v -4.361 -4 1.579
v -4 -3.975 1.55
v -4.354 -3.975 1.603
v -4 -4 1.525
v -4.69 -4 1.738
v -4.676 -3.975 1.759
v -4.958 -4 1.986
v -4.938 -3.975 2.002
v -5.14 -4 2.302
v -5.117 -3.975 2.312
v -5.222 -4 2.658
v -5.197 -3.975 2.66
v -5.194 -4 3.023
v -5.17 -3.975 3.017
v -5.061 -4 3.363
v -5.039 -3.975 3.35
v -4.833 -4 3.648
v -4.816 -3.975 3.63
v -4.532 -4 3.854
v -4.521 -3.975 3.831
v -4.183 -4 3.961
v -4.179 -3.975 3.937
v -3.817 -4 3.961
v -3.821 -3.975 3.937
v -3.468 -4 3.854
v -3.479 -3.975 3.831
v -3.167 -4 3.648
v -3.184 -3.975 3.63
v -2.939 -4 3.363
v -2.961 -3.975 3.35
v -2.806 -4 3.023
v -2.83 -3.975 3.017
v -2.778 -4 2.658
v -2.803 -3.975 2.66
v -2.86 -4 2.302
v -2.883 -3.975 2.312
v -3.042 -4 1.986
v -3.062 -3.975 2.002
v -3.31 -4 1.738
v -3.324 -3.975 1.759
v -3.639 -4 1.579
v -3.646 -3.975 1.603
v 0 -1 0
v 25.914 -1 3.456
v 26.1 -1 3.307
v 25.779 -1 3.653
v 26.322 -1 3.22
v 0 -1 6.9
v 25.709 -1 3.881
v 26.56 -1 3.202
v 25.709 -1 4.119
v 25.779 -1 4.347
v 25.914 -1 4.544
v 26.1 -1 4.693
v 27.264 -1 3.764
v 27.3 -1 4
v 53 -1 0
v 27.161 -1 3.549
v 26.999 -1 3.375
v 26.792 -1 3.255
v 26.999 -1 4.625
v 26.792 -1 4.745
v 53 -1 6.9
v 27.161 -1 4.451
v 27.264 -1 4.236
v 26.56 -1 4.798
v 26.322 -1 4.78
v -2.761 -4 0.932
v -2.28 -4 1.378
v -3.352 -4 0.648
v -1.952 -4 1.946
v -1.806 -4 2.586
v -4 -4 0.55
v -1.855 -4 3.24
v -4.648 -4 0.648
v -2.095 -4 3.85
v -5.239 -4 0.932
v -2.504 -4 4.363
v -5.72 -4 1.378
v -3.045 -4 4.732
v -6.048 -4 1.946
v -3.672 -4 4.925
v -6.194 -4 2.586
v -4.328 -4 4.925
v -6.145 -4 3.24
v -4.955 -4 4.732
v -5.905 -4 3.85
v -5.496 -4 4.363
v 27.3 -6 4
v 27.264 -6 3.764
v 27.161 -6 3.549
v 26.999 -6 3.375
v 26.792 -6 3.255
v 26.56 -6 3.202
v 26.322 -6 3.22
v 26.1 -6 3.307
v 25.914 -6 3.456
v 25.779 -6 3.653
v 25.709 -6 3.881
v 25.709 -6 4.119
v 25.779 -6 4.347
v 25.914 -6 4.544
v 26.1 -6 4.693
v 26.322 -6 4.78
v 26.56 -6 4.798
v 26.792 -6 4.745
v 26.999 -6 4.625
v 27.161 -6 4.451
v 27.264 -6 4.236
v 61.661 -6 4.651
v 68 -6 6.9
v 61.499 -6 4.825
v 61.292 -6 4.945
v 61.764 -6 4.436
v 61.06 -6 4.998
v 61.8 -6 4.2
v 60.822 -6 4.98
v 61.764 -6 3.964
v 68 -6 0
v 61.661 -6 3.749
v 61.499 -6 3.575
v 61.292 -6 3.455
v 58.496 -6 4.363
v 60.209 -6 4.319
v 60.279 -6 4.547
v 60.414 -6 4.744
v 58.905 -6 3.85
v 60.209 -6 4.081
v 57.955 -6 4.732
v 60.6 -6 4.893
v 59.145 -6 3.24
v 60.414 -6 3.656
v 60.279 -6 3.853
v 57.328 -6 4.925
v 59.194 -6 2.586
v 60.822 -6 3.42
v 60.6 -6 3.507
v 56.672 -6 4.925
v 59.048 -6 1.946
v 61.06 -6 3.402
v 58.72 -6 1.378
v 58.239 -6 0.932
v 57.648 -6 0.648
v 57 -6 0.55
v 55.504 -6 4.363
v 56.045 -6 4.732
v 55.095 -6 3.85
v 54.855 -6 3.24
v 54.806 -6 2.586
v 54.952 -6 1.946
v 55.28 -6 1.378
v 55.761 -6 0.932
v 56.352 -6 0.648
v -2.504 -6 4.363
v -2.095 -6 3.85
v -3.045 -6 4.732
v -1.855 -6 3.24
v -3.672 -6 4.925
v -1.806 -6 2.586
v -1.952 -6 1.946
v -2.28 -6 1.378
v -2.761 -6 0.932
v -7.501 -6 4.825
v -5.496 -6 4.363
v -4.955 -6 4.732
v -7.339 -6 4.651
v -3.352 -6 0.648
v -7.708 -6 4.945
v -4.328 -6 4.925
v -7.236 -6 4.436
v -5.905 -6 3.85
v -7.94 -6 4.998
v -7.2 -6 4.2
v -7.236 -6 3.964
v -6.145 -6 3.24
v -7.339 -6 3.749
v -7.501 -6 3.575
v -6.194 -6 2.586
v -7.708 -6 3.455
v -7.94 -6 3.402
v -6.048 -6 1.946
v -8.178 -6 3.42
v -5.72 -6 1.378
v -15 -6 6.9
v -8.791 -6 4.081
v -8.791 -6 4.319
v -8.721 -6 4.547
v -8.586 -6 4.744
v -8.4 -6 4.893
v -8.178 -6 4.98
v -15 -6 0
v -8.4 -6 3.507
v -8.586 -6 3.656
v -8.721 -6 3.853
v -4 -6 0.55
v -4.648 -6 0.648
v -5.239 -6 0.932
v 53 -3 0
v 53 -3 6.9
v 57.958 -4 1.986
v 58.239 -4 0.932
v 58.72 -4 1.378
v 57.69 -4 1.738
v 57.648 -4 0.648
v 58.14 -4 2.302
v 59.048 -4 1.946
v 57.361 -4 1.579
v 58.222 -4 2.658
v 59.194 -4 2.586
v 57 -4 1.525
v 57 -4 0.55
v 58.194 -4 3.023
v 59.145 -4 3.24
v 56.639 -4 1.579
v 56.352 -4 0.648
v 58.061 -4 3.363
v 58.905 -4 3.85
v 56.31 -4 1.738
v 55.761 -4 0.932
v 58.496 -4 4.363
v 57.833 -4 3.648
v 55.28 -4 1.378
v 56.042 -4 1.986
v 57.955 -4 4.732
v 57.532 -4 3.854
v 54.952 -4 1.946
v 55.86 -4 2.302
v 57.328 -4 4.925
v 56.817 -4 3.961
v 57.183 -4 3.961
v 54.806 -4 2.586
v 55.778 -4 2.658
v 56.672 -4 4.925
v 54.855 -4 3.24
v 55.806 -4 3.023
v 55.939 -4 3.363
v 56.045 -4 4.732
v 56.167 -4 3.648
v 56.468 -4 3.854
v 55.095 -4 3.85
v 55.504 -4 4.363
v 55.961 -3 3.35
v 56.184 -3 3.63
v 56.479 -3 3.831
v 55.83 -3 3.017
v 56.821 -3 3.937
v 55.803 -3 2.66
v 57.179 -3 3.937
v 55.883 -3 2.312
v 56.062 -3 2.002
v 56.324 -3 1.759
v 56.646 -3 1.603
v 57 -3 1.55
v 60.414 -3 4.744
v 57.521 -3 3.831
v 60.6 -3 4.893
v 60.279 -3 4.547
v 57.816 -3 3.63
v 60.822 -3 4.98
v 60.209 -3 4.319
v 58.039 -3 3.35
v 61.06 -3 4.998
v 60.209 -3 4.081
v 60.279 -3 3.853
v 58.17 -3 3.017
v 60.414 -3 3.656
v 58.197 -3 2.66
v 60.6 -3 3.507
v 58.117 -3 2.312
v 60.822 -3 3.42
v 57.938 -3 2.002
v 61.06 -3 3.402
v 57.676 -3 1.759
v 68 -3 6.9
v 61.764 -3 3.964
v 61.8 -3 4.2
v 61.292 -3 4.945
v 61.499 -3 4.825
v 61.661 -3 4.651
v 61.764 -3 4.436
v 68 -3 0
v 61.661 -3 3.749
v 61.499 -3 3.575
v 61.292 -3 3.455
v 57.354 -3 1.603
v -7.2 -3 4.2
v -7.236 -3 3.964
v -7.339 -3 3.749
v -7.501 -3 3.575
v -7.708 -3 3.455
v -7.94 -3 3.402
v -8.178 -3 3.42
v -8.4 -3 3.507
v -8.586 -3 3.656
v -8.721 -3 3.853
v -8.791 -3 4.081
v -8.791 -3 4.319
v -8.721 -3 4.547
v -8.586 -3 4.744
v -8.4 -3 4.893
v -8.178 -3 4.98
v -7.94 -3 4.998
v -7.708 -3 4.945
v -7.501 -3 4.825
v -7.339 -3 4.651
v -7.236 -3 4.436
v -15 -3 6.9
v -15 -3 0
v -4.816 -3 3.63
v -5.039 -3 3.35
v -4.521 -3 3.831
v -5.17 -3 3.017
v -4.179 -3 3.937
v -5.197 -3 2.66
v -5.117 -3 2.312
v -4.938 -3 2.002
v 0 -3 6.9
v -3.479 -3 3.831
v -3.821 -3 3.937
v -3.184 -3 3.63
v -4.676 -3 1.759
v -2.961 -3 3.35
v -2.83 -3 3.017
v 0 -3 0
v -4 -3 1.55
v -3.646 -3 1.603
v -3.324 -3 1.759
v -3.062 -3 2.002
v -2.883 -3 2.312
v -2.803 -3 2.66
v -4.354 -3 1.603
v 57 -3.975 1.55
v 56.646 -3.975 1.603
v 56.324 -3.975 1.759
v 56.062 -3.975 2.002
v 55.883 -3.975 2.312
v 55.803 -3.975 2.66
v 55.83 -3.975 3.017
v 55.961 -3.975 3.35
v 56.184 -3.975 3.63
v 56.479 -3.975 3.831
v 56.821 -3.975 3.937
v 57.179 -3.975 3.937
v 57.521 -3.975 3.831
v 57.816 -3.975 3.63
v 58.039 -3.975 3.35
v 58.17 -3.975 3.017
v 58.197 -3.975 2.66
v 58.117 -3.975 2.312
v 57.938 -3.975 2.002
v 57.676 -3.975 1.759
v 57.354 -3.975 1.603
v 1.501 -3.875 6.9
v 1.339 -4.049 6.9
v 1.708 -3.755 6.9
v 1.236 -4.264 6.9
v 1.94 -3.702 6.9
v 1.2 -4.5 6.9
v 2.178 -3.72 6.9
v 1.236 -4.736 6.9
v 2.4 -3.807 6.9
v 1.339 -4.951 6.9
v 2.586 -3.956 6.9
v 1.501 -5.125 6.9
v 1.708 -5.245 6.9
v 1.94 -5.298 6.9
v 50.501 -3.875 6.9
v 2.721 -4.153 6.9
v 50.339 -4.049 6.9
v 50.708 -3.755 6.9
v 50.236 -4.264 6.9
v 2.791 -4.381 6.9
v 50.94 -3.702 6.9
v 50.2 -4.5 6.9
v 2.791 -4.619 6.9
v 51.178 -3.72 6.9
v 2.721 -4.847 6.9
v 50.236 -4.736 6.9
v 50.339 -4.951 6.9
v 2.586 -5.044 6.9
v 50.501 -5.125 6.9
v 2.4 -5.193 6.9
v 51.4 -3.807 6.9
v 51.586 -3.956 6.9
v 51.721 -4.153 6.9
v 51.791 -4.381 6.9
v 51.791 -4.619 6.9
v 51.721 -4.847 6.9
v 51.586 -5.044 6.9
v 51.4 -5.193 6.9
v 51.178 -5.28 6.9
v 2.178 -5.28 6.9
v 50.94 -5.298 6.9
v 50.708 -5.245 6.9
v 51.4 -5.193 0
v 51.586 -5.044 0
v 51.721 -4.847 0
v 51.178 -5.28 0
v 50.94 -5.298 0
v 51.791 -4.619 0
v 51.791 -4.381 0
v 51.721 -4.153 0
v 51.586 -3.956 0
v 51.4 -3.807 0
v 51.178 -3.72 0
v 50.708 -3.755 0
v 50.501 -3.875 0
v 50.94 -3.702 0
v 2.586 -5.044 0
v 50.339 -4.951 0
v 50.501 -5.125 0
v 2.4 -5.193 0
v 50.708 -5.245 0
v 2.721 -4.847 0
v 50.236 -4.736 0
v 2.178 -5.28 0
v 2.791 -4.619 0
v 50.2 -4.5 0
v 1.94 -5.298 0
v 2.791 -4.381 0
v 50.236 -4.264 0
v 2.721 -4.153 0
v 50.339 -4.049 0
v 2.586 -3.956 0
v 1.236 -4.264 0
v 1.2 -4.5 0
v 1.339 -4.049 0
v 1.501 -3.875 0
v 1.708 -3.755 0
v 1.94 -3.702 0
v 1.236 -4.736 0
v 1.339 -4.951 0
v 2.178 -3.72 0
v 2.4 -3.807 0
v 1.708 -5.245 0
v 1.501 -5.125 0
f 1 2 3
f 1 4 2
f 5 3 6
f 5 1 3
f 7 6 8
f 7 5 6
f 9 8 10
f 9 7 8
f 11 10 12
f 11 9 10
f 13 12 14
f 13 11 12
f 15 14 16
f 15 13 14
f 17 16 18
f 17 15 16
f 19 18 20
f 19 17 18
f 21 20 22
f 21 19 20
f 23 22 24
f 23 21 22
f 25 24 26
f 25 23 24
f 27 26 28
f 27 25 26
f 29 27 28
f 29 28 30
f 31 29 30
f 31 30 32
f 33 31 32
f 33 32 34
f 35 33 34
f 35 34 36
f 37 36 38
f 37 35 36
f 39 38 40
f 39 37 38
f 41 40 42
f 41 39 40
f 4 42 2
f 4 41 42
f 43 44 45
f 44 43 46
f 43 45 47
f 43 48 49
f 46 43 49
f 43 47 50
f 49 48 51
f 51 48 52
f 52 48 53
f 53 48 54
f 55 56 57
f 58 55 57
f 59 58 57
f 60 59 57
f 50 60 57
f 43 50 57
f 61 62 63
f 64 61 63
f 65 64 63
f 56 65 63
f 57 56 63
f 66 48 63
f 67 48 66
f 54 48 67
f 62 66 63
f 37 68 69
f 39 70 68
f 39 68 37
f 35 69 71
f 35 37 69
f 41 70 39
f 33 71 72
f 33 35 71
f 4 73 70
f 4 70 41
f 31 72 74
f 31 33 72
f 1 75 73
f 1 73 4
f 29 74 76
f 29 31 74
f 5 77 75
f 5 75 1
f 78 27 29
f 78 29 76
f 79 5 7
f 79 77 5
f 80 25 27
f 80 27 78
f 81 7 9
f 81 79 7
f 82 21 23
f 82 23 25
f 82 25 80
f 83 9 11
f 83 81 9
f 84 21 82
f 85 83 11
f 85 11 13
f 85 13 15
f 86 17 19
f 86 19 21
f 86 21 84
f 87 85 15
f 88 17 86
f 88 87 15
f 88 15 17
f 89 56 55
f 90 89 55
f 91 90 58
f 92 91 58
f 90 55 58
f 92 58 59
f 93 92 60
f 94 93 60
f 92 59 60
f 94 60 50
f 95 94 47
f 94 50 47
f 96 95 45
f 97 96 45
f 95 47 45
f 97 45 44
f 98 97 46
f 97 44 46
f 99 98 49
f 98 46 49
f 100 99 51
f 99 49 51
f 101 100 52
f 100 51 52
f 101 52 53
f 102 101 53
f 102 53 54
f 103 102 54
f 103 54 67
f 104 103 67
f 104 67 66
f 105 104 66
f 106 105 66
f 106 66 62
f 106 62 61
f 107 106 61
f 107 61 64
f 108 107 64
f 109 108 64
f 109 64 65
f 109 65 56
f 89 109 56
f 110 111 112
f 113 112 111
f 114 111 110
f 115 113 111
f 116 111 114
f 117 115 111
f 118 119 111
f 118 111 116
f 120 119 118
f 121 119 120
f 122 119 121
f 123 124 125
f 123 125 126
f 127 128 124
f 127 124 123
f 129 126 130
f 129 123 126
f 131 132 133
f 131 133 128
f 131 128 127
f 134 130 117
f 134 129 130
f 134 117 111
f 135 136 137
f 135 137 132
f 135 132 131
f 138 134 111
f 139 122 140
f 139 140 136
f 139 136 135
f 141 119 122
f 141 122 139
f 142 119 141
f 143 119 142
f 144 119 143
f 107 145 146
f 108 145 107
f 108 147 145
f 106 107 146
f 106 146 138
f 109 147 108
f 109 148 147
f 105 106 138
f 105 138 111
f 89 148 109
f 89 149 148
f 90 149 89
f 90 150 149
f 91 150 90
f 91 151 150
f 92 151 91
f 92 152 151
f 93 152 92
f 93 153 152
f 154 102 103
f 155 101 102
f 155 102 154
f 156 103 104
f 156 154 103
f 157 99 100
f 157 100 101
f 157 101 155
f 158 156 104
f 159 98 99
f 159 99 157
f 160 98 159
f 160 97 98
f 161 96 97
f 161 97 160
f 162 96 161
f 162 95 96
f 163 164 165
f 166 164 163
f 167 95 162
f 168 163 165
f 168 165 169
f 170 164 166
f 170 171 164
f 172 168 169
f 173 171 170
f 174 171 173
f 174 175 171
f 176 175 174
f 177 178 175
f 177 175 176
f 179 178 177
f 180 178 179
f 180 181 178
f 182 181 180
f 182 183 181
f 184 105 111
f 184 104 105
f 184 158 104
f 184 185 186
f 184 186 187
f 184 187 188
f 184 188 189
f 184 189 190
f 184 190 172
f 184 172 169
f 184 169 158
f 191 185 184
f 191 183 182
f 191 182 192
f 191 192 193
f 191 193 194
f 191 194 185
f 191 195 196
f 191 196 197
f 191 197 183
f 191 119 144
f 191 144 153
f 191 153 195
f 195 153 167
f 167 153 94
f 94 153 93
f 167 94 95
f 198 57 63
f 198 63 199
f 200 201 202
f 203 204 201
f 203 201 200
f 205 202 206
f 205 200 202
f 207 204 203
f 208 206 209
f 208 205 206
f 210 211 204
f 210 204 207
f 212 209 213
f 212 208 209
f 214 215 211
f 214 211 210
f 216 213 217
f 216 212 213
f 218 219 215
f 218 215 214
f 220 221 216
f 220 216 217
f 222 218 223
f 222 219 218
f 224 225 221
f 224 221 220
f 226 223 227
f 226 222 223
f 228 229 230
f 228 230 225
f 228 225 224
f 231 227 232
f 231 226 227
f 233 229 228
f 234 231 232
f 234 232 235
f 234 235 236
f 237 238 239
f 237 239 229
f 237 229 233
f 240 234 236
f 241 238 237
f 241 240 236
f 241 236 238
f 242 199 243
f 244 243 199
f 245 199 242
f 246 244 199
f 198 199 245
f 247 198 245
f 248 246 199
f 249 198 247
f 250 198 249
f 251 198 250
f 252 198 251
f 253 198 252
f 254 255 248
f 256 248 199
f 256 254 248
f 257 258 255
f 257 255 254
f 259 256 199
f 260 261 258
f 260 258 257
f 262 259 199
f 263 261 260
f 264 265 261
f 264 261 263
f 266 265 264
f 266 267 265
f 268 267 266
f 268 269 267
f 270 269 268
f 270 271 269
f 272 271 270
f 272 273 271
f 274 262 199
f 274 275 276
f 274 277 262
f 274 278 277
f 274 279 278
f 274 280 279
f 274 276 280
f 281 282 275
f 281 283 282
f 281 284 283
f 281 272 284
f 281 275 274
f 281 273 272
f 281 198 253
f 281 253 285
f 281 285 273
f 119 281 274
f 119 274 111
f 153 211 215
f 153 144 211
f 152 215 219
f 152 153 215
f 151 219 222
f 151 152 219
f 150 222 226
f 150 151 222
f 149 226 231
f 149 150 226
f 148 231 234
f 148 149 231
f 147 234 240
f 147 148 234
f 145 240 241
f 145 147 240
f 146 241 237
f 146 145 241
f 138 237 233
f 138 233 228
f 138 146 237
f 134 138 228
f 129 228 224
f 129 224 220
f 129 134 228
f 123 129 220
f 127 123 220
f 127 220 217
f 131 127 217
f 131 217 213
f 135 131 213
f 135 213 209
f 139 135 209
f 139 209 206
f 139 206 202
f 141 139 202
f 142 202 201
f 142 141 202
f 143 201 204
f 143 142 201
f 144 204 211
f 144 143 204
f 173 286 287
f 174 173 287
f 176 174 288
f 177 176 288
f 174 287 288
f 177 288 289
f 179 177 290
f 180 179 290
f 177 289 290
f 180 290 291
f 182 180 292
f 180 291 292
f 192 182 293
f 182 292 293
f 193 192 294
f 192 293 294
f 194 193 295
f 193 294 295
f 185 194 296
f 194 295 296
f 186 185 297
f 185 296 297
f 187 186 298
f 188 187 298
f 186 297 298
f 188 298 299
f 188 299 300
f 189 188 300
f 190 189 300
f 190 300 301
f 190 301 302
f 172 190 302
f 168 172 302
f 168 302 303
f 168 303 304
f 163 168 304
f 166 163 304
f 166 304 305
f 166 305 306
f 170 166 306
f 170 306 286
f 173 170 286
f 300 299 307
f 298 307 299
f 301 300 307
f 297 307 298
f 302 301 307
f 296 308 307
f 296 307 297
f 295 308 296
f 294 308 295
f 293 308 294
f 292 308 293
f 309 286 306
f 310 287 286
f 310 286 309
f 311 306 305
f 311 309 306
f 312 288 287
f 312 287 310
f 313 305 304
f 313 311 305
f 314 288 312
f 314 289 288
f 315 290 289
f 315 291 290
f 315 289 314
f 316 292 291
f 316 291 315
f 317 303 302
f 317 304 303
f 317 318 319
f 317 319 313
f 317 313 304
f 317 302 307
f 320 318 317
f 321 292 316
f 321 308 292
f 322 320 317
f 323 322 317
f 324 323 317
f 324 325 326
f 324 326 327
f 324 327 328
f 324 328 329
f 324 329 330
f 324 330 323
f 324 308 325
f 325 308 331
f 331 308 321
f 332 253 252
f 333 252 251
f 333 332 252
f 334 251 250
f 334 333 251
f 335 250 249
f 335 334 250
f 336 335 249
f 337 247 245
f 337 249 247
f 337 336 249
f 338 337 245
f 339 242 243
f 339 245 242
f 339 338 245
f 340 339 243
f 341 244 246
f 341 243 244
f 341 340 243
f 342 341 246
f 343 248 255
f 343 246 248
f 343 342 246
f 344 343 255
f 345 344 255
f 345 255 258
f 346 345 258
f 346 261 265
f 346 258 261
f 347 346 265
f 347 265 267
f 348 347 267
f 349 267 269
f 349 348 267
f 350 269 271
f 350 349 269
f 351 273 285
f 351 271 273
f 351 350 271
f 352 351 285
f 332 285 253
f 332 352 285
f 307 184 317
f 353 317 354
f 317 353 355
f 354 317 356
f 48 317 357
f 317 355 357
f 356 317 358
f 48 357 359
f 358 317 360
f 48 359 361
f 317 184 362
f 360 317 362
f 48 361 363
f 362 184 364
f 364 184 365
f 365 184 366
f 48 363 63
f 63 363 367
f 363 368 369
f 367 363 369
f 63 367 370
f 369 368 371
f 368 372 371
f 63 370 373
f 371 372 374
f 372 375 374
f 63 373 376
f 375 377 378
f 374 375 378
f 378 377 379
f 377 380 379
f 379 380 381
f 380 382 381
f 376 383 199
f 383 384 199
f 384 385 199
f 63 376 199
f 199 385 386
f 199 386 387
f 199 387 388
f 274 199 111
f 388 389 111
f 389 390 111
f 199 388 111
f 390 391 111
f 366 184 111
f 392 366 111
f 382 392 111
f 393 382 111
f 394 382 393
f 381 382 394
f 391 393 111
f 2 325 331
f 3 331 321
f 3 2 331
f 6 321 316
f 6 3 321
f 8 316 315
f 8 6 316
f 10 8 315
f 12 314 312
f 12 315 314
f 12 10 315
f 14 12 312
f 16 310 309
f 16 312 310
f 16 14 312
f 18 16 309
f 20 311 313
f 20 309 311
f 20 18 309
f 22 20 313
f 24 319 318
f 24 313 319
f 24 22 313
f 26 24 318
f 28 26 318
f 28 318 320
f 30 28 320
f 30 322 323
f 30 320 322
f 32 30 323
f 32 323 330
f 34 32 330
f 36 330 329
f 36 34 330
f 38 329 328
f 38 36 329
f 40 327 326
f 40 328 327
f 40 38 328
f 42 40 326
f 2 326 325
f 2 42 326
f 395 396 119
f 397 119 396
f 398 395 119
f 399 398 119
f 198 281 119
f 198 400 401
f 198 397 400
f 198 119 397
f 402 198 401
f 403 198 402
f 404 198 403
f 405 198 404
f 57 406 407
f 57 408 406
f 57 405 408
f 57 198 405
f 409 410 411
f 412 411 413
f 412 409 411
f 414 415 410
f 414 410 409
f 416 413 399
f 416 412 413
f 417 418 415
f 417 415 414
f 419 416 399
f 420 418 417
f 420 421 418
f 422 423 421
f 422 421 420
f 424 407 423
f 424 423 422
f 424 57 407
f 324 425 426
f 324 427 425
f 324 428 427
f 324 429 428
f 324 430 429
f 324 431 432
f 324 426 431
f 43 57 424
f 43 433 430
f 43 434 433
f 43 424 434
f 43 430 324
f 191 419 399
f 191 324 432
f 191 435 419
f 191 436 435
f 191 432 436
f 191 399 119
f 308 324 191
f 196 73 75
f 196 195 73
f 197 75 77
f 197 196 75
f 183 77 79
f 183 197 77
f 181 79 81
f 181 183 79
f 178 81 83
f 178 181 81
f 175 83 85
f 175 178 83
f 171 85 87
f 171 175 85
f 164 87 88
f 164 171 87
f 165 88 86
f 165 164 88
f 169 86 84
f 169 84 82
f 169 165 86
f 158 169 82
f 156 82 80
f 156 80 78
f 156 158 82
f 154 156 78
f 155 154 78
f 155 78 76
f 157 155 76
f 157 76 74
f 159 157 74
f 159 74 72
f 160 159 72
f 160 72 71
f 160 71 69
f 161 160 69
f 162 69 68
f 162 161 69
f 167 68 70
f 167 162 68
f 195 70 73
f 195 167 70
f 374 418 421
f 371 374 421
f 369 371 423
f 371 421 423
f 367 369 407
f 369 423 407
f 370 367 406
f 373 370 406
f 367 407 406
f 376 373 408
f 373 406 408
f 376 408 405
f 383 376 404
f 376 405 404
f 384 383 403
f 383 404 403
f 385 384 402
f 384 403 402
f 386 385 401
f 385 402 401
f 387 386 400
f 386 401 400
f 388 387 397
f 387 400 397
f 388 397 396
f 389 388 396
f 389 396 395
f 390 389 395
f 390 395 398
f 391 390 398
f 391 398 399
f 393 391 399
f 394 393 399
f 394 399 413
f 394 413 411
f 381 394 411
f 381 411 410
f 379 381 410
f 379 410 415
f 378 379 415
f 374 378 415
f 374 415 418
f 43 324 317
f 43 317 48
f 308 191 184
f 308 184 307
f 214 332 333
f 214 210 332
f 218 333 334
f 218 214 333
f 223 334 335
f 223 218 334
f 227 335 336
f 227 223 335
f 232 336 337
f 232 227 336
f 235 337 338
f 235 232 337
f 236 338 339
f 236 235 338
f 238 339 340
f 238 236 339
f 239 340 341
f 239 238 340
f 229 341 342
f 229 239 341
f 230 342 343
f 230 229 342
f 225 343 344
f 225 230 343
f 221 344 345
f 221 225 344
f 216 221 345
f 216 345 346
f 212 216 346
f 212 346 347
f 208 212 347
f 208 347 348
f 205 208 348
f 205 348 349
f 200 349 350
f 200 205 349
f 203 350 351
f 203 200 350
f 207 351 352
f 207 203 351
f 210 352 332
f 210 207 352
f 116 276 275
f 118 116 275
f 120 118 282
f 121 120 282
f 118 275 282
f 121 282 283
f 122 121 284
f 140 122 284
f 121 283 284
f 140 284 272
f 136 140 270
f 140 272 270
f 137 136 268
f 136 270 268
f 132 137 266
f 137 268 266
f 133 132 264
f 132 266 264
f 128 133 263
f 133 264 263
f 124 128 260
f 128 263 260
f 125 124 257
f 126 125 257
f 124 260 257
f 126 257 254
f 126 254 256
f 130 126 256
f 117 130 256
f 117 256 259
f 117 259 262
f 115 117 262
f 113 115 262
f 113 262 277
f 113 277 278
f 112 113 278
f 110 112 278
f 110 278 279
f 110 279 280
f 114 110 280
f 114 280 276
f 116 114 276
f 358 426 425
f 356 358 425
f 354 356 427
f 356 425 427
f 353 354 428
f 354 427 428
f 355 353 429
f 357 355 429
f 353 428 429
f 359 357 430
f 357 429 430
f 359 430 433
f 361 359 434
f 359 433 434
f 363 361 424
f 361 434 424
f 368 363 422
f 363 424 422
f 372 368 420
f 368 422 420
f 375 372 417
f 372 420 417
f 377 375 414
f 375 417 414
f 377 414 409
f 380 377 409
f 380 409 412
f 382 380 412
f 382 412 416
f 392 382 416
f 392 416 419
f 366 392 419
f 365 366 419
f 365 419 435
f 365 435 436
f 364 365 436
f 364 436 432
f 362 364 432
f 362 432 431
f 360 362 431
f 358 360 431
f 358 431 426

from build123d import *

# Parameters (mm, degrees)
BOSS_EXTRUDE1_DEPTH                            = 8.5
CBORE_FOR_M2_SOCKET_HEAD_CAP_SCREW1_AT_2_COUNT = 2
CBORE_FOR_M2_SOCKET_HEAD_CAP_SCREW1_AT_2_PITCH = 61
SKETCH8_W                                      = 53
SKETCH8_H                                      = 1
CUT_EXTRUDE1_DEPTH                             = 9.5
M2X0_4_TAPPED_HOLE8_D                          = 1.6
SKETCH14_W                                     = 83
SKETCH14_H                                     = 1.6
CUT_EXTRUDE2_DEPTH                             = 10
M2X0_4_TAPPED_HOLE7_D                          = 1.6
M2X0_4_TAPPED_HOLE6_D                          = 1.6
M2X0_4_TAPPED_HOLE6_DEPTH                      = 5.2
M2X0_4_TAPPED_HOLE6_TIP                        = 0.480688495


with BuildPart() as part:
    # Sketch1 → Boss-Extrude1 (new body)
    with BuildSketch(Plane.XY):
        Polygon((53, -3), (68, -3), (68, -6), (-15, -6), (-15, -3), (0, -3), (0, 0), (53, 0), align=None)
    extrude(amount=BOSS_EXTRUDE1_DEPTH)

    # Sketch4 → CBORE for M2 Socket Head Cap Screw1 (revolve, cut)
    with BuildSketch(Plane(origin=(-4, -6, 2.75), x_dir=(0, 0, -1), z_dir=(1, 0, 0))):
        Polygon((0, 0), (0, 6), (1.2, 6), (1.2, 2.025), (1.225, 2), (2.2, 2), (2.2, 0), align=None)
    cbore_for_m2_socket_head_cap_screw1 = revolve(axis=Axis((-4, -12.35, 2.75), (0, 1, 0)), mode=Mode.SUBTRACT)

    # CBORE for M2 Socket Head Cap Screw1 at 2: CBORE for M2 Socket Head Cap Screw1 ×2
    with Locations(*[(i * CBORE_FOR_M2_SOCKET_HEAD_CAP_SCREW1_AT_2_PITCH, 0, 0) for i in range(1, CBORE_FOR_M2_SOCKET_HEAD_CAP_SCREW1_AT_2_COUNT)]):
        add(cbore_for_m2_socket_head_cap_screw1, mode=Mode.SUBTRACT)

    # Sketch8 → Cut-Extrude1 (cut, through all)
    with BuildSketch(Plane.XY.offset(8.5)):
        with Locations((26.5, -0.5)):
            Rectangle(SKETCH8_W, SKETCH8_H)
    extrude(amount=-CUT_EXTRUDE1_DEPTH, mode=Mode.SUBTRACT)

    # M2x0.4 Tapped Hole8 (through all)
    with Locations(Plane.XY.offset(8.5)):
        with Locations((2, -4.5), (51, -4.5)):
            Hole(M2X0_4_TAPPED_HOLE8_D / 2)

    # Sketch14 → Cut-Extrude2 (cut)
    with BuildSketch(Plane.XZ.offset(6)):
        with Locations((26.5, 7.7)):
            Rectangle(SKETCH14_W, SKETCH14_H)
    extrude(amount=-CUT_EXTRUDE2_DEPTH, mode=Mode.SUBTRACT)

    # M2x0.4 Tapped Hole7 (through all)
    with Locations(Plane(origin=(0, -6, 0), x_dir=(-1, 0, 0), z_dir=(0, -1, 0))):
        with Locations((8, -4.2), (-61, -4.2)):
            Hole(M2X0_4_TAPPED_HOLE7_D / 2)

    # M2x0.4 Tapped Hole6
    with Locations(Plane(origin=(0, -6, 0), x_dir=(-1, 0, 0), z_dir=(0, -1, 0))):
        with Locations((-26.5, -4)):
            Hole(M2X0_4_TAPPED_HOLE6_D / 2, depth=M2X0_4_TAPPED_HOLE6_DEPTH)
            with Locations((0, 0, -(M2X0_4_TAPPED_HOLE6_DEPTH + M2X0_4_TAPPED_HOLE6_TIP / 2))):  # 118° drill point
                Cone(0, M2X0_4_TAPPED_HOLE6_D / 2, M2X0_4_TAPPED_HOLE6_TIP, mode=Mode.SUBTRACT)


solid = part.part
